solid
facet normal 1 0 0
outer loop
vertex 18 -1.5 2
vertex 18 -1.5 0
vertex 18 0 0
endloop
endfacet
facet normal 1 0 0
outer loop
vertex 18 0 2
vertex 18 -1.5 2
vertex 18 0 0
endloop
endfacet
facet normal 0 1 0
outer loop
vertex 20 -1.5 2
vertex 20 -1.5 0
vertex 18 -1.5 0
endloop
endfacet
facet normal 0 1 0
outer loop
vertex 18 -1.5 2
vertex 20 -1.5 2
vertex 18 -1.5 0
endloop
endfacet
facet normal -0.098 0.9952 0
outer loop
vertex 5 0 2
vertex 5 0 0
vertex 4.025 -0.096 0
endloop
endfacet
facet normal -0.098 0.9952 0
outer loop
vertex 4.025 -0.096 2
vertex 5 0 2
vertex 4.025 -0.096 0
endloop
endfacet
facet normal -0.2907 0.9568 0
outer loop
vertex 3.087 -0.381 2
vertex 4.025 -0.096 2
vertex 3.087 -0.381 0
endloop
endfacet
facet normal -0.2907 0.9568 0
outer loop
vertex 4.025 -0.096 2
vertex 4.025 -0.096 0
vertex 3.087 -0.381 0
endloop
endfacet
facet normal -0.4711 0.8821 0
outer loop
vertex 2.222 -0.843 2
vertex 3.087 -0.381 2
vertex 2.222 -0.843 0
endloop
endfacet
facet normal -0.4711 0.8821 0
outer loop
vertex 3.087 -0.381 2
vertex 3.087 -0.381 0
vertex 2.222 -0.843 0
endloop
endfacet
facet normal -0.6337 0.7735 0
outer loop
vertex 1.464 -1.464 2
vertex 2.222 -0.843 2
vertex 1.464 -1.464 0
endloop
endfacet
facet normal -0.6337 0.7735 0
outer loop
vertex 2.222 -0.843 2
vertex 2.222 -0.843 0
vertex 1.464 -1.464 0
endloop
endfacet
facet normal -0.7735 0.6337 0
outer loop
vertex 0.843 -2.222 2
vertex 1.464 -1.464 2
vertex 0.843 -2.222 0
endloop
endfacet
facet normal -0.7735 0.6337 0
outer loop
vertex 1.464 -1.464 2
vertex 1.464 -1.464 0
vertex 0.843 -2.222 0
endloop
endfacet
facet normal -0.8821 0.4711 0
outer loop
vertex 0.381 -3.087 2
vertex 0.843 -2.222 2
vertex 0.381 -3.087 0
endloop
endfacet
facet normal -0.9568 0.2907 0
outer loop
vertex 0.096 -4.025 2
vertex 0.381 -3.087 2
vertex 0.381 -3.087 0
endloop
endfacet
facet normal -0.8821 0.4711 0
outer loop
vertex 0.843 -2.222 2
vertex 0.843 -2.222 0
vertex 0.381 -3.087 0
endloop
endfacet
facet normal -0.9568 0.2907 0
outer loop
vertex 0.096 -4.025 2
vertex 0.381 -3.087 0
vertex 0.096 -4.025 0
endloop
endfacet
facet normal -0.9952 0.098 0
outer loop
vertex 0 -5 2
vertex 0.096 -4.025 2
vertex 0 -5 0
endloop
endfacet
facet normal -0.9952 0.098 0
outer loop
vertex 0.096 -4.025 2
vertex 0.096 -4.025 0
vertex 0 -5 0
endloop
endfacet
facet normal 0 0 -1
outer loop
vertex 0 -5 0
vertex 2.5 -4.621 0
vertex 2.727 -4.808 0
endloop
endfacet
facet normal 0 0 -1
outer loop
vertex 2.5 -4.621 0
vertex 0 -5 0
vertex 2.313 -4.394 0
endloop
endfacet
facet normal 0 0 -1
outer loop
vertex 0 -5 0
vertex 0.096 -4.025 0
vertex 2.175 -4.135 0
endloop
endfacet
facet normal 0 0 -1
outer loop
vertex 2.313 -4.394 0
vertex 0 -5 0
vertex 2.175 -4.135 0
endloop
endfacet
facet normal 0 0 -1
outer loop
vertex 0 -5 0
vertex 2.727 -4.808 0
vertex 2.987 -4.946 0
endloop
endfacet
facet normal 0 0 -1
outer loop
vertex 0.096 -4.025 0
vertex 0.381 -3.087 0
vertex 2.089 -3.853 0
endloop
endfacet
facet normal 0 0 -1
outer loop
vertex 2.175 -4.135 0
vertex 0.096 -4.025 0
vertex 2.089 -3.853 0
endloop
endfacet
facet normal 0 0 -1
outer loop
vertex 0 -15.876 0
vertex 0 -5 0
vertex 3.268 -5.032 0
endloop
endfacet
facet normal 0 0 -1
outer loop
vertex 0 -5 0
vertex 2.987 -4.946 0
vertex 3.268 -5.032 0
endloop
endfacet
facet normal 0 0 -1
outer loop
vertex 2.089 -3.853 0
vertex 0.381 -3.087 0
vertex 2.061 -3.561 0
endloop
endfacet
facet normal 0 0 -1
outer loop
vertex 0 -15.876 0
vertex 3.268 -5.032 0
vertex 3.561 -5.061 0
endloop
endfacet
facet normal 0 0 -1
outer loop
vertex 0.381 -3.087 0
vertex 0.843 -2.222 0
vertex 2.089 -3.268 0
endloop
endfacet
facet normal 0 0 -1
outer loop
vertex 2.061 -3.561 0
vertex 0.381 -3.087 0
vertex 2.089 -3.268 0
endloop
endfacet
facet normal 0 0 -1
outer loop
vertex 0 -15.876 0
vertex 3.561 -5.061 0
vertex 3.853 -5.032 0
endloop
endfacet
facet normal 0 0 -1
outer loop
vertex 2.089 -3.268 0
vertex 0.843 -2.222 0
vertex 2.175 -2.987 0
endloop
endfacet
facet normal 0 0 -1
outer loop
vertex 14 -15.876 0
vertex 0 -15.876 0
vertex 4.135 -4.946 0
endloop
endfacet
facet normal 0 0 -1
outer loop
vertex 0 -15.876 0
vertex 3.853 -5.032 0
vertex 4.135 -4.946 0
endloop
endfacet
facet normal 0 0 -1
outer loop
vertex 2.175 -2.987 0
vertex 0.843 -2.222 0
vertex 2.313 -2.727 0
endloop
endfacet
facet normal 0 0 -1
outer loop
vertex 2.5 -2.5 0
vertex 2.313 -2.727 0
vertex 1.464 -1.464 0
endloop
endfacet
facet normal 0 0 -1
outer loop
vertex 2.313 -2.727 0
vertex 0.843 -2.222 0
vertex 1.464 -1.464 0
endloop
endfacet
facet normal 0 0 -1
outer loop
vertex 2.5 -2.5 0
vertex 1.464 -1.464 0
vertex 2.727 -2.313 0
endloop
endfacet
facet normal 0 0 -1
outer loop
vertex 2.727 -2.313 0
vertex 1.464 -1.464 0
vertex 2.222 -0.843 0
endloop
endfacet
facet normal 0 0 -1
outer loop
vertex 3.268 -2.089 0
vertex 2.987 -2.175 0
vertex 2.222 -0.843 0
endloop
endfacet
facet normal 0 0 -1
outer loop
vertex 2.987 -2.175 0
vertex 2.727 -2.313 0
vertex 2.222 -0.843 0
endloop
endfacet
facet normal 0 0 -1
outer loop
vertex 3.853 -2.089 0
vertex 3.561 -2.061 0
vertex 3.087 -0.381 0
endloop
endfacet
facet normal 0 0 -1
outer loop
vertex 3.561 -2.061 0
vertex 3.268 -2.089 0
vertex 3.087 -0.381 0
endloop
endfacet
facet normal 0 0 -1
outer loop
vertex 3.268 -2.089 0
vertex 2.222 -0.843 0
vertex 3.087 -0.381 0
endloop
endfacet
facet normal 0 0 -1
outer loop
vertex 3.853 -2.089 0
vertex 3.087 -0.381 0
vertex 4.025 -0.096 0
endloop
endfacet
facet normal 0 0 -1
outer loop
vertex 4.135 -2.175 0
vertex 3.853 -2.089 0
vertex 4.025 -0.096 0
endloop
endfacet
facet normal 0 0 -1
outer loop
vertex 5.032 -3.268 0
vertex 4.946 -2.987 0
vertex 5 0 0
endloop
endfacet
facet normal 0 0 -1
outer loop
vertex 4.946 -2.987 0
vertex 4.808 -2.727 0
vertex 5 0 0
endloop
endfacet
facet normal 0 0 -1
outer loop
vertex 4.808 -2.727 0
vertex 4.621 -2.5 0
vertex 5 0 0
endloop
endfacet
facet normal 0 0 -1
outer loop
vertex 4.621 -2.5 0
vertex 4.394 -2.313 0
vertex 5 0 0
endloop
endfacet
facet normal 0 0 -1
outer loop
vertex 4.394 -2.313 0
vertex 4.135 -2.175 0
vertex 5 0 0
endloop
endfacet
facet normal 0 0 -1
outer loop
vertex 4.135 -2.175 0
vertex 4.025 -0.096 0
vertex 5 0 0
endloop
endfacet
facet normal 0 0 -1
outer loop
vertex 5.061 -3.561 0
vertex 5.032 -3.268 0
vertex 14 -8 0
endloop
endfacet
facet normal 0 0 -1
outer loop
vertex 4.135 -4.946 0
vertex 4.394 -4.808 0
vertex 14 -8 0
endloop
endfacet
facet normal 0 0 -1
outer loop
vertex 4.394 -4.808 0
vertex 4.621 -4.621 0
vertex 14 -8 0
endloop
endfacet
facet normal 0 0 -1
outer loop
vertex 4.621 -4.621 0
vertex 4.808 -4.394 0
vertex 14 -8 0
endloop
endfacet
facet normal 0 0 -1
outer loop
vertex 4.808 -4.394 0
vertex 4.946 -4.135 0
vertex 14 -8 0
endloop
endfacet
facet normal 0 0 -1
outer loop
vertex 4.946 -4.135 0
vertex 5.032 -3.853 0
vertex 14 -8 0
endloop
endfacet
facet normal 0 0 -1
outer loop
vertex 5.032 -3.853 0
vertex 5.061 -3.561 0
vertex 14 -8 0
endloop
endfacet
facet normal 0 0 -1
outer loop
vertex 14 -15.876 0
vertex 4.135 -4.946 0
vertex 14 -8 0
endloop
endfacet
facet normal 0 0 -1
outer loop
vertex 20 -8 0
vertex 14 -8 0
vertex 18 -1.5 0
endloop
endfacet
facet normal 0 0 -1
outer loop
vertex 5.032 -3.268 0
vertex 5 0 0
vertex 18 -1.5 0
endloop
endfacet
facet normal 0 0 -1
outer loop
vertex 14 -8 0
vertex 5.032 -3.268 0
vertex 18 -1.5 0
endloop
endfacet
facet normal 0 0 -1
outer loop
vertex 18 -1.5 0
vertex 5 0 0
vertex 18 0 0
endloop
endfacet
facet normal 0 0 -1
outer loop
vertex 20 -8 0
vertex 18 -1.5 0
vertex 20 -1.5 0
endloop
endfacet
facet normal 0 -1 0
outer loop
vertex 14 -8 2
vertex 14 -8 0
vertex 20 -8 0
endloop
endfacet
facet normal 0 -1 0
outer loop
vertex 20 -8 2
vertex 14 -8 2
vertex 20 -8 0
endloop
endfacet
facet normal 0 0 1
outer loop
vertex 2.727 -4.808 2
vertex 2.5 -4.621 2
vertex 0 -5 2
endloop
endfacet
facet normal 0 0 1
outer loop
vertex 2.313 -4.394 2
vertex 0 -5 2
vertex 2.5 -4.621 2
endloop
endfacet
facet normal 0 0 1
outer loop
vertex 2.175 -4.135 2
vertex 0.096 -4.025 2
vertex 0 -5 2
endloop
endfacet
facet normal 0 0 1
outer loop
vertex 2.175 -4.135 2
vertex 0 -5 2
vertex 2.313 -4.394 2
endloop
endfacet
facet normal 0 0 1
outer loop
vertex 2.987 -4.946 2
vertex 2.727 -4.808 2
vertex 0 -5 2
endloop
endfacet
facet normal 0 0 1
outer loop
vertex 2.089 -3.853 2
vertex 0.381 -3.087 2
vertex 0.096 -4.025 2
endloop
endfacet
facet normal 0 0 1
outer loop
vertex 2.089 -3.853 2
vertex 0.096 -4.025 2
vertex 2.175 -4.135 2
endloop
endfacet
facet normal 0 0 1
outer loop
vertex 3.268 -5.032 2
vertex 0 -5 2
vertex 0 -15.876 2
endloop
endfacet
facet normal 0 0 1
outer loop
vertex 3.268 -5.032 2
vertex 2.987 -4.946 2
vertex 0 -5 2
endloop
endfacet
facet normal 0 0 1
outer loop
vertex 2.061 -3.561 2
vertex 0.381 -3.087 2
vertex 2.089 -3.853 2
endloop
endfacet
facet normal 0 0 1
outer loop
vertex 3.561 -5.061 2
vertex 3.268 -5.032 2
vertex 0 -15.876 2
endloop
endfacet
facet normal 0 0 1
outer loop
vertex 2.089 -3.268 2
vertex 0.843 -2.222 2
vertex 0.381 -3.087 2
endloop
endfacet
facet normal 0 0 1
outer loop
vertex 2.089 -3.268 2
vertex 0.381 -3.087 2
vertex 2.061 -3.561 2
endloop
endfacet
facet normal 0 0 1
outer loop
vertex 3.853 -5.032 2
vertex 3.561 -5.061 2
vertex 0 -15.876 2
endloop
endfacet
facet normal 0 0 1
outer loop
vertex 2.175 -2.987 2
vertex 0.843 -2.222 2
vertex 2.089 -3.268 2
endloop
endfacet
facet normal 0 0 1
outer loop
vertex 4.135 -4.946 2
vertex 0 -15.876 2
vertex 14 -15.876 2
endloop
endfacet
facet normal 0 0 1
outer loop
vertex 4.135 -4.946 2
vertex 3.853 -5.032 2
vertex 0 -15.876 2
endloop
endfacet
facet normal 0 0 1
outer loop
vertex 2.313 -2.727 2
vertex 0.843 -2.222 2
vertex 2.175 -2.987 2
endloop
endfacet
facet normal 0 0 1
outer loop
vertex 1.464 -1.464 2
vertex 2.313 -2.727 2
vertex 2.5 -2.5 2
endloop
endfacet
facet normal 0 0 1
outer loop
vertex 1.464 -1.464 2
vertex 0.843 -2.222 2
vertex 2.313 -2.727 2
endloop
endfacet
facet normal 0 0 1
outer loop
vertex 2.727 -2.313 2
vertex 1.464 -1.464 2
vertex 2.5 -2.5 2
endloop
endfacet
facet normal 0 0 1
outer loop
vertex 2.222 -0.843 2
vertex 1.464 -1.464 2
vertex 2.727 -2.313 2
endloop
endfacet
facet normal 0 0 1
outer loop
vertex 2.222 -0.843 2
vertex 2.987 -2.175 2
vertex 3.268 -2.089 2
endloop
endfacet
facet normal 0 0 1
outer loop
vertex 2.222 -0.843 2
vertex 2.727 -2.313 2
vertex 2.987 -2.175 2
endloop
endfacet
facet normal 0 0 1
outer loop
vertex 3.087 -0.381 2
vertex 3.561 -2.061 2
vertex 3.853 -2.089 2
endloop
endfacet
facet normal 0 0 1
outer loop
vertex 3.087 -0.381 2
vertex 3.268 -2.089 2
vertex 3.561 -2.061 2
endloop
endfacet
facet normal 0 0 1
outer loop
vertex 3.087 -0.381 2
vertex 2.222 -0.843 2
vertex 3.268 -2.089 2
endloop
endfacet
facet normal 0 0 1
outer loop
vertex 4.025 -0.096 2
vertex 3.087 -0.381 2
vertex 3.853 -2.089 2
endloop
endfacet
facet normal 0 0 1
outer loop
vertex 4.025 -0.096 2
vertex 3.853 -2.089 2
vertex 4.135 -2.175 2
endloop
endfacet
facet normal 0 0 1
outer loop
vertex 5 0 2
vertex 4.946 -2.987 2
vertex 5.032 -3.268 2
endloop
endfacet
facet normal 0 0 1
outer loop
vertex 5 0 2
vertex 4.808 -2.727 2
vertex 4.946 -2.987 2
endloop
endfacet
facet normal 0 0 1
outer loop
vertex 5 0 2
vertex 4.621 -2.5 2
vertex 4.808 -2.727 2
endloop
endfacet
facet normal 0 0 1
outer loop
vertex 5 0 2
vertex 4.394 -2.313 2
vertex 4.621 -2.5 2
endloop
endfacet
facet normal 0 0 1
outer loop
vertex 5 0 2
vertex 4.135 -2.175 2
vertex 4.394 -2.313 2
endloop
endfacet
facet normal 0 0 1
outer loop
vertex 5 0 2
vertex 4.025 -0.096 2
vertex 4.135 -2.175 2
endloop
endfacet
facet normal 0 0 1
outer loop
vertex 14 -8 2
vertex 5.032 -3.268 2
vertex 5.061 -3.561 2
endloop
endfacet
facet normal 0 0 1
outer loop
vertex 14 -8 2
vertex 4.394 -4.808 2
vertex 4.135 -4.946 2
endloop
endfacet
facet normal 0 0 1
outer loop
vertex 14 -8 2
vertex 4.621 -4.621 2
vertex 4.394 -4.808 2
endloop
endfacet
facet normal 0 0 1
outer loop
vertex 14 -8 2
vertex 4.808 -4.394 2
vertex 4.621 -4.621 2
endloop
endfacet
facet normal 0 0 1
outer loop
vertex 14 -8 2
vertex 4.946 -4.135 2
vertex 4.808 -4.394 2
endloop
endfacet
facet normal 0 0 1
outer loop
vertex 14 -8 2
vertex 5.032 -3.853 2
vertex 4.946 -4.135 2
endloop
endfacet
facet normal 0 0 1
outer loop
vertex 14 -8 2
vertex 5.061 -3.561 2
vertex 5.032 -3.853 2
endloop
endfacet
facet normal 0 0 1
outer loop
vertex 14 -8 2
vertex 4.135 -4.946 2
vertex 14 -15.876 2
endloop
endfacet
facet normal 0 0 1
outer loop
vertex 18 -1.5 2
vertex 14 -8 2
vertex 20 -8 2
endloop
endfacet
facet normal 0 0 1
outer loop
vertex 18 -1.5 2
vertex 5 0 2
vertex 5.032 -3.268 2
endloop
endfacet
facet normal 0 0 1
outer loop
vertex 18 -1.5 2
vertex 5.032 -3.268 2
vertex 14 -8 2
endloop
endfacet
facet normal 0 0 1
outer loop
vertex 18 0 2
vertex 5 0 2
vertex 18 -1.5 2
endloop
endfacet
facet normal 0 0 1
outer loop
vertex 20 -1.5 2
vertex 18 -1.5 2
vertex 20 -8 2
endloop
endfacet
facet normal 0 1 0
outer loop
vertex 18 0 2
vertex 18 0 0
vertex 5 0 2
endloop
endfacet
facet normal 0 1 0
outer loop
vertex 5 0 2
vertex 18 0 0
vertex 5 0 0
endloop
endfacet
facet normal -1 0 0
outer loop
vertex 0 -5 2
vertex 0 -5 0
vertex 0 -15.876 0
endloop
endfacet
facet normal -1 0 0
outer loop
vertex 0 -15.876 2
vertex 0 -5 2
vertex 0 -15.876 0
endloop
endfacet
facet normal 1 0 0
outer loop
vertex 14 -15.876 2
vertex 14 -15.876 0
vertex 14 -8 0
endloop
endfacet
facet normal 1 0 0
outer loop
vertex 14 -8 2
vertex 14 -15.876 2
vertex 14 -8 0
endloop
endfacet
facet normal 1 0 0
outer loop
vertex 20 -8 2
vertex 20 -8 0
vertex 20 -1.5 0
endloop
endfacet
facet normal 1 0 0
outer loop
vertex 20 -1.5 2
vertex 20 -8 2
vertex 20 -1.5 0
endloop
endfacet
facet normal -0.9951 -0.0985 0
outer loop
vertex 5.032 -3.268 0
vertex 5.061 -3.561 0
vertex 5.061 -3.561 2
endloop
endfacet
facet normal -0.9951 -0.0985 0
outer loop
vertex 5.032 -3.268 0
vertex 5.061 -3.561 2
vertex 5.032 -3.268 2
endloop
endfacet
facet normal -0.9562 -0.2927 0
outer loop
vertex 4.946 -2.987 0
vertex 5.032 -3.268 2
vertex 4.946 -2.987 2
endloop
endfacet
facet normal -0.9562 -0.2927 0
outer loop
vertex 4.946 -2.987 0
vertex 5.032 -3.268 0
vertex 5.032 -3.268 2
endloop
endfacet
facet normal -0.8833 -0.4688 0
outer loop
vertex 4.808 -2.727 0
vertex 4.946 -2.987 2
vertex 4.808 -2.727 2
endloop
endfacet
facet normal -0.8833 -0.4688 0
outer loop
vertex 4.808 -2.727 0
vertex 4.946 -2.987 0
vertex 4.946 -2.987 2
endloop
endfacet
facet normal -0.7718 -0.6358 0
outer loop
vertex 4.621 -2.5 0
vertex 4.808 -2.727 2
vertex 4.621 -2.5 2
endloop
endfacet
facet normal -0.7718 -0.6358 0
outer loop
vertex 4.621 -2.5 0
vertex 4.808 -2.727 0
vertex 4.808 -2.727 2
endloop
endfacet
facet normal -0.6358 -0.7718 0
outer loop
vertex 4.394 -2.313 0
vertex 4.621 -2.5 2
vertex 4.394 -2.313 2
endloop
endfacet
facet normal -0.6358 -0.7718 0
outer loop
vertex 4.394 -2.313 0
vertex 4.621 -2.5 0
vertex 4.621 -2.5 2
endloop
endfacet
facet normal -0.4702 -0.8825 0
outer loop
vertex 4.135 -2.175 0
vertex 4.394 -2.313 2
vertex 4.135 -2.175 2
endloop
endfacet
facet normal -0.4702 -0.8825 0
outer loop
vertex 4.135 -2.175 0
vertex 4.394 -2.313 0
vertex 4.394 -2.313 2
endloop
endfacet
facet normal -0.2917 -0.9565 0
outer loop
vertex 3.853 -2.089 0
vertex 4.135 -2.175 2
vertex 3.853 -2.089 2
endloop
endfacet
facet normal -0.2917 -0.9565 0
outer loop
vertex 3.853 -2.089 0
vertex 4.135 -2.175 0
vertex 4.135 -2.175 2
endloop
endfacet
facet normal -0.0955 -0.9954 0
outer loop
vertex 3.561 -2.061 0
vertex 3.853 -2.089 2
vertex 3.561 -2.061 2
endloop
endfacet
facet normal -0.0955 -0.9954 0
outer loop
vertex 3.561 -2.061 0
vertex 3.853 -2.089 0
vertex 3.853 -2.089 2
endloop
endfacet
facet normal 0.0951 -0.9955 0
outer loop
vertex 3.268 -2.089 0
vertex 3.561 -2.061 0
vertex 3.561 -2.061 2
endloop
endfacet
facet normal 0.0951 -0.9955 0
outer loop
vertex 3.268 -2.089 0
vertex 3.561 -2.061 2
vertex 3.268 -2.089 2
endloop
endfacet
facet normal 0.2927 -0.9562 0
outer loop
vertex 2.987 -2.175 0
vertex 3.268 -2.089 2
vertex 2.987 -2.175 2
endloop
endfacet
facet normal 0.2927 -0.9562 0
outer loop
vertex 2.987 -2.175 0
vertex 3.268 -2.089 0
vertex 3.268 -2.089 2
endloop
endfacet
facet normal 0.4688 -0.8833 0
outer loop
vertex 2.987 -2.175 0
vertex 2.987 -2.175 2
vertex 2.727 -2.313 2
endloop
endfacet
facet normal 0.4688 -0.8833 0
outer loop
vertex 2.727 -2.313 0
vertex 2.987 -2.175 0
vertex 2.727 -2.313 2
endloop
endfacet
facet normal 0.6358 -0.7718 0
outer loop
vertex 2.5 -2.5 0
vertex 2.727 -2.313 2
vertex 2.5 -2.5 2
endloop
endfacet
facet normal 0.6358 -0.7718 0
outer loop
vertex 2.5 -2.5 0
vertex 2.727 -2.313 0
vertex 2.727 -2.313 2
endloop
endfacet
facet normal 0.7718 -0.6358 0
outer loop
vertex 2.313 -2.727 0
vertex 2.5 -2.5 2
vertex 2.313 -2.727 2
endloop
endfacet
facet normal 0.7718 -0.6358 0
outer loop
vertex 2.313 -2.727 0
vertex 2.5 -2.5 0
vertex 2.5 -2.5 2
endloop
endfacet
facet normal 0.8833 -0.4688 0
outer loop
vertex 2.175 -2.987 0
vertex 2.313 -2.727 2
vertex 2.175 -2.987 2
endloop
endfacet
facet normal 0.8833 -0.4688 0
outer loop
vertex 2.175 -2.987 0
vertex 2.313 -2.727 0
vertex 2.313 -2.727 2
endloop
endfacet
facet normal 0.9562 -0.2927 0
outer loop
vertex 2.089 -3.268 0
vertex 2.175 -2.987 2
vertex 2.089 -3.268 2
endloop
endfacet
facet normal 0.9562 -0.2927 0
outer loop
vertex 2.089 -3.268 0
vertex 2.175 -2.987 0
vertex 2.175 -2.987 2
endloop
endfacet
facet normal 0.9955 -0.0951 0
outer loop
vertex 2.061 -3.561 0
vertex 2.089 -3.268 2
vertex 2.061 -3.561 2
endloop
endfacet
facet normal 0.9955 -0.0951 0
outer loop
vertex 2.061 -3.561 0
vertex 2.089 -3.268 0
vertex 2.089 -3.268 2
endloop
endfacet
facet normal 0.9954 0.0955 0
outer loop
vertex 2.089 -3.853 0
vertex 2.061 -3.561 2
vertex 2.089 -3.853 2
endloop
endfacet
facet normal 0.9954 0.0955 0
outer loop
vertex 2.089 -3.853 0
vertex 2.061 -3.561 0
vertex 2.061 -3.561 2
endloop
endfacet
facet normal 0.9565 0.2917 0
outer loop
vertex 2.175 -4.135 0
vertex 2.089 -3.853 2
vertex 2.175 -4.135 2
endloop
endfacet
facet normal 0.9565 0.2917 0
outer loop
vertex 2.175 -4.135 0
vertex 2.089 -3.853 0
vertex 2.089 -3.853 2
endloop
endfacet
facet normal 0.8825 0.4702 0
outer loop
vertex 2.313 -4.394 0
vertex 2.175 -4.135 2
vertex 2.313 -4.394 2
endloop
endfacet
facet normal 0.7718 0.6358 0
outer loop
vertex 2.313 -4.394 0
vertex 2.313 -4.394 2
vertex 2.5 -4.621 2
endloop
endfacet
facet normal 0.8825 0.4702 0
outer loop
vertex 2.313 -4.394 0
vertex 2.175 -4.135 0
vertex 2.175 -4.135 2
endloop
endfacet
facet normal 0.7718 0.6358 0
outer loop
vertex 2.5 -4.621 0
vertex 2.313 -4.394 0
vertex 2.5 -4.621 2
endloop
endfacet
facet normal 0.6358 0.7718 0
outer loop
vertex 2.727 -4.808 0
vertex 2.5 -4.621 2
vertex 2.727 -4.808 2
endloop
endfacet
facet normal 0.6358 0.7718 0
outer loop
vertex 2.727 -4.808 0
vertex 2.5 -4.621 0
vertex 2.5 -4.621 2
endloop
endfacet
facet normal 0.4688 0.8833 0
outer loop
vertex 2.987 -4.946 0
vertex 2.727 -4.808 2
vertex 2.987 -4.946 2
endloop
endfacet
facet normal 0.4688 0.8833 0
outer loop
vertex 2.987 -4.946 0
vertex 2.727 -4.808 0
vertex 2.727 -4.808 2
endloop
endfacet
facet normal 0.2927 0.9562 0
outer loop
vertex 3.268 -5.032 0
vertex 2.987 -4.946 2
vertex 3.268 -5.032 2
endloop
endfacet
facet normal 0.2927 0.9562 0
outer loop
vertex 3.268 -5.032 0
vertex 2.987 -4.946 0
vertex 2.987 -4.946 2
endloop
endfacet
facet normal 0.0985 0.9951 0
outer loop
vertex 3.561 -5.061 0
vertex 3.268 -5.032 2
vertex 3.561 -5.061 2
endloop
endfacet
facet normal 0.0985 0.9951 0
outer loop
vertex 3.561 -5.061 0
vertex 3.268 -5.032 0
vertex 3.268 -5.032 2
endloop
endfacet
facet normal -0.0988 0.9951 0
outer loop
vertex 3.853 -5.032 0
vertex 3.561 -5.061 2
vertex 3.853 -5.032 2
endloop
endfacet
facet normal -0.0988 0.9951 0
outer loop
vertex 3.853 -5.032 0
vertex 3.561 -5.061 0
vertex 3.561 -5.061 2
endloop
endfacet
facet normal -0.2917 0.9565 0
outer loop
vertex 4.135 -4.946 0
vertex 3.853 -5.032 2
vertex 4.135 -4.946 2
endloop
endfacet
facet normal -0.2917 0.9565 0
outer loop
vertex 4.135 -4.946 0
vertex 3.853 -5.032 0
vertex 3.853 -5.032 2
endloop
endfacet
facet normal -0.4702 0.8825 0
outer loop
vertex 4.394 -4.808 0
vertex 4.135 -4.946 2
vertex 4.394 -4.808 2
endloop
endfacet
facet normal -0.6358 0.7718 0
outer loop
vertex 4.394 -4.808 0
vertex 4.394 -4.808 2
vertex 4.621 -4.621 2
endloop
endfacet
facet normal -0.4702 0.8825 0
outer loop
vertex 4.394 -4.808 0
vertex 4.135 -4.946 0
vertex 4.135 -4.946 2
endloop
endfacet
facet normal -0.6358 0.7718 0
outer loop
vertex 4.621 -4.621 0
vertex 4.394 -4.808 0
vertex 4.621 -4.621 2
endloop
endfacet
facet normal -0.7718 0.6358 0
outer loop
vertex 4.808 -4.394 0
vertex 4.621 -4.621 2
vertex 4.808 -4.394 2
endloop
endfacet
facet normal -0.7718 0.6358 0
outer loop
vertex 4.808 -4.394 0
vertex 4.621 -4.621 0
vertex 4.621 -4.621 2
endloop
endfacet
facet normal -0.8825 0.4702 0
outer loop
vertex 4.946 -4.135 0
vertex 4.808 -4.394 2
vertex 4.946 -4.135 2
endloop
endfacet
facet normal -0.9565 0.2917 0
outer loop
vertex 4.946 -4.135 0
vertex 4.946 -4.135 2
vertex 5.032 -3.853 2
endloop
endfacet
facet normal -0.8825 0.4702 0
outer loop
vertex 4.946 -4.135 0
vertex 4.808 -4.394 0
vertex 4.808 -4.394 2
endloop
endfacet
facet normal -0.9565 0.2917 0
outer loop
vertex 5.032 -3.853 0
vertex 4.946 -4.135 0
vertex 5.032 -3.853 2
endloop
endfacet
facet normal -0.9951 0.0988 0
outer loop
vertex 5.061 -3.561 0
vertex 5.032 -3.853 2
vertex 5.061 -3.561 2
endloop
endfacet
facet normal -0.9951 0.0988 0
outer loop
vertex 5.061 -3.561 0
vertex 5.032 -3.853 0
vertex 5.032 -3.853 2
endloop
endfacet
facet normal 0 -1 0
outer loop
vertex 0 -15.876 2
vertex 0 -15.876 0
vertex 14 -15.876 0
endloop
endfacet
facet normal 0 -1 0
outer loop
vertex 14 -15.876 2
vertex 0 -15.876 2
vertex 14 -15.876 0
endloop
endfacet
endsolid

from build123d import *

# Parameters (mm, degrees)
SKETCH1_R           = 1.5
BOSS_EXTRUDE1_DEPTH = 2


with BuildPart() as part:
    # Sketch1 → Boss-Extrude1 (new body)
    with BuildSketch(Plane.XY):
        with BuildLine():
            Line((14, -8), (20, -8))
            Line((20, -8), (20, -1.5))
            Line((20, -1.5), (18, -1.5))
            Line((18, -1.5), (18, 0))
            Line((18, 0), (5, 0))
            ThreePointArc((5, 0), (1.464466094, -1.464466094), (0, -5))
            Line((0, -5), (0, -15.875626598))
            Line((0, -15.875626598), (14, -15.875626598))
            Line((14, -15.875626598), (14, -8))
        make_face()
        with Locations((3.560660172, -3.560660172)):
            Circle(SKETCH1_R, mode=Mode.SUBTRACT)
    extrude(amount=BOSS_EXTRUDE1_DEPTH)


solid = part.part
